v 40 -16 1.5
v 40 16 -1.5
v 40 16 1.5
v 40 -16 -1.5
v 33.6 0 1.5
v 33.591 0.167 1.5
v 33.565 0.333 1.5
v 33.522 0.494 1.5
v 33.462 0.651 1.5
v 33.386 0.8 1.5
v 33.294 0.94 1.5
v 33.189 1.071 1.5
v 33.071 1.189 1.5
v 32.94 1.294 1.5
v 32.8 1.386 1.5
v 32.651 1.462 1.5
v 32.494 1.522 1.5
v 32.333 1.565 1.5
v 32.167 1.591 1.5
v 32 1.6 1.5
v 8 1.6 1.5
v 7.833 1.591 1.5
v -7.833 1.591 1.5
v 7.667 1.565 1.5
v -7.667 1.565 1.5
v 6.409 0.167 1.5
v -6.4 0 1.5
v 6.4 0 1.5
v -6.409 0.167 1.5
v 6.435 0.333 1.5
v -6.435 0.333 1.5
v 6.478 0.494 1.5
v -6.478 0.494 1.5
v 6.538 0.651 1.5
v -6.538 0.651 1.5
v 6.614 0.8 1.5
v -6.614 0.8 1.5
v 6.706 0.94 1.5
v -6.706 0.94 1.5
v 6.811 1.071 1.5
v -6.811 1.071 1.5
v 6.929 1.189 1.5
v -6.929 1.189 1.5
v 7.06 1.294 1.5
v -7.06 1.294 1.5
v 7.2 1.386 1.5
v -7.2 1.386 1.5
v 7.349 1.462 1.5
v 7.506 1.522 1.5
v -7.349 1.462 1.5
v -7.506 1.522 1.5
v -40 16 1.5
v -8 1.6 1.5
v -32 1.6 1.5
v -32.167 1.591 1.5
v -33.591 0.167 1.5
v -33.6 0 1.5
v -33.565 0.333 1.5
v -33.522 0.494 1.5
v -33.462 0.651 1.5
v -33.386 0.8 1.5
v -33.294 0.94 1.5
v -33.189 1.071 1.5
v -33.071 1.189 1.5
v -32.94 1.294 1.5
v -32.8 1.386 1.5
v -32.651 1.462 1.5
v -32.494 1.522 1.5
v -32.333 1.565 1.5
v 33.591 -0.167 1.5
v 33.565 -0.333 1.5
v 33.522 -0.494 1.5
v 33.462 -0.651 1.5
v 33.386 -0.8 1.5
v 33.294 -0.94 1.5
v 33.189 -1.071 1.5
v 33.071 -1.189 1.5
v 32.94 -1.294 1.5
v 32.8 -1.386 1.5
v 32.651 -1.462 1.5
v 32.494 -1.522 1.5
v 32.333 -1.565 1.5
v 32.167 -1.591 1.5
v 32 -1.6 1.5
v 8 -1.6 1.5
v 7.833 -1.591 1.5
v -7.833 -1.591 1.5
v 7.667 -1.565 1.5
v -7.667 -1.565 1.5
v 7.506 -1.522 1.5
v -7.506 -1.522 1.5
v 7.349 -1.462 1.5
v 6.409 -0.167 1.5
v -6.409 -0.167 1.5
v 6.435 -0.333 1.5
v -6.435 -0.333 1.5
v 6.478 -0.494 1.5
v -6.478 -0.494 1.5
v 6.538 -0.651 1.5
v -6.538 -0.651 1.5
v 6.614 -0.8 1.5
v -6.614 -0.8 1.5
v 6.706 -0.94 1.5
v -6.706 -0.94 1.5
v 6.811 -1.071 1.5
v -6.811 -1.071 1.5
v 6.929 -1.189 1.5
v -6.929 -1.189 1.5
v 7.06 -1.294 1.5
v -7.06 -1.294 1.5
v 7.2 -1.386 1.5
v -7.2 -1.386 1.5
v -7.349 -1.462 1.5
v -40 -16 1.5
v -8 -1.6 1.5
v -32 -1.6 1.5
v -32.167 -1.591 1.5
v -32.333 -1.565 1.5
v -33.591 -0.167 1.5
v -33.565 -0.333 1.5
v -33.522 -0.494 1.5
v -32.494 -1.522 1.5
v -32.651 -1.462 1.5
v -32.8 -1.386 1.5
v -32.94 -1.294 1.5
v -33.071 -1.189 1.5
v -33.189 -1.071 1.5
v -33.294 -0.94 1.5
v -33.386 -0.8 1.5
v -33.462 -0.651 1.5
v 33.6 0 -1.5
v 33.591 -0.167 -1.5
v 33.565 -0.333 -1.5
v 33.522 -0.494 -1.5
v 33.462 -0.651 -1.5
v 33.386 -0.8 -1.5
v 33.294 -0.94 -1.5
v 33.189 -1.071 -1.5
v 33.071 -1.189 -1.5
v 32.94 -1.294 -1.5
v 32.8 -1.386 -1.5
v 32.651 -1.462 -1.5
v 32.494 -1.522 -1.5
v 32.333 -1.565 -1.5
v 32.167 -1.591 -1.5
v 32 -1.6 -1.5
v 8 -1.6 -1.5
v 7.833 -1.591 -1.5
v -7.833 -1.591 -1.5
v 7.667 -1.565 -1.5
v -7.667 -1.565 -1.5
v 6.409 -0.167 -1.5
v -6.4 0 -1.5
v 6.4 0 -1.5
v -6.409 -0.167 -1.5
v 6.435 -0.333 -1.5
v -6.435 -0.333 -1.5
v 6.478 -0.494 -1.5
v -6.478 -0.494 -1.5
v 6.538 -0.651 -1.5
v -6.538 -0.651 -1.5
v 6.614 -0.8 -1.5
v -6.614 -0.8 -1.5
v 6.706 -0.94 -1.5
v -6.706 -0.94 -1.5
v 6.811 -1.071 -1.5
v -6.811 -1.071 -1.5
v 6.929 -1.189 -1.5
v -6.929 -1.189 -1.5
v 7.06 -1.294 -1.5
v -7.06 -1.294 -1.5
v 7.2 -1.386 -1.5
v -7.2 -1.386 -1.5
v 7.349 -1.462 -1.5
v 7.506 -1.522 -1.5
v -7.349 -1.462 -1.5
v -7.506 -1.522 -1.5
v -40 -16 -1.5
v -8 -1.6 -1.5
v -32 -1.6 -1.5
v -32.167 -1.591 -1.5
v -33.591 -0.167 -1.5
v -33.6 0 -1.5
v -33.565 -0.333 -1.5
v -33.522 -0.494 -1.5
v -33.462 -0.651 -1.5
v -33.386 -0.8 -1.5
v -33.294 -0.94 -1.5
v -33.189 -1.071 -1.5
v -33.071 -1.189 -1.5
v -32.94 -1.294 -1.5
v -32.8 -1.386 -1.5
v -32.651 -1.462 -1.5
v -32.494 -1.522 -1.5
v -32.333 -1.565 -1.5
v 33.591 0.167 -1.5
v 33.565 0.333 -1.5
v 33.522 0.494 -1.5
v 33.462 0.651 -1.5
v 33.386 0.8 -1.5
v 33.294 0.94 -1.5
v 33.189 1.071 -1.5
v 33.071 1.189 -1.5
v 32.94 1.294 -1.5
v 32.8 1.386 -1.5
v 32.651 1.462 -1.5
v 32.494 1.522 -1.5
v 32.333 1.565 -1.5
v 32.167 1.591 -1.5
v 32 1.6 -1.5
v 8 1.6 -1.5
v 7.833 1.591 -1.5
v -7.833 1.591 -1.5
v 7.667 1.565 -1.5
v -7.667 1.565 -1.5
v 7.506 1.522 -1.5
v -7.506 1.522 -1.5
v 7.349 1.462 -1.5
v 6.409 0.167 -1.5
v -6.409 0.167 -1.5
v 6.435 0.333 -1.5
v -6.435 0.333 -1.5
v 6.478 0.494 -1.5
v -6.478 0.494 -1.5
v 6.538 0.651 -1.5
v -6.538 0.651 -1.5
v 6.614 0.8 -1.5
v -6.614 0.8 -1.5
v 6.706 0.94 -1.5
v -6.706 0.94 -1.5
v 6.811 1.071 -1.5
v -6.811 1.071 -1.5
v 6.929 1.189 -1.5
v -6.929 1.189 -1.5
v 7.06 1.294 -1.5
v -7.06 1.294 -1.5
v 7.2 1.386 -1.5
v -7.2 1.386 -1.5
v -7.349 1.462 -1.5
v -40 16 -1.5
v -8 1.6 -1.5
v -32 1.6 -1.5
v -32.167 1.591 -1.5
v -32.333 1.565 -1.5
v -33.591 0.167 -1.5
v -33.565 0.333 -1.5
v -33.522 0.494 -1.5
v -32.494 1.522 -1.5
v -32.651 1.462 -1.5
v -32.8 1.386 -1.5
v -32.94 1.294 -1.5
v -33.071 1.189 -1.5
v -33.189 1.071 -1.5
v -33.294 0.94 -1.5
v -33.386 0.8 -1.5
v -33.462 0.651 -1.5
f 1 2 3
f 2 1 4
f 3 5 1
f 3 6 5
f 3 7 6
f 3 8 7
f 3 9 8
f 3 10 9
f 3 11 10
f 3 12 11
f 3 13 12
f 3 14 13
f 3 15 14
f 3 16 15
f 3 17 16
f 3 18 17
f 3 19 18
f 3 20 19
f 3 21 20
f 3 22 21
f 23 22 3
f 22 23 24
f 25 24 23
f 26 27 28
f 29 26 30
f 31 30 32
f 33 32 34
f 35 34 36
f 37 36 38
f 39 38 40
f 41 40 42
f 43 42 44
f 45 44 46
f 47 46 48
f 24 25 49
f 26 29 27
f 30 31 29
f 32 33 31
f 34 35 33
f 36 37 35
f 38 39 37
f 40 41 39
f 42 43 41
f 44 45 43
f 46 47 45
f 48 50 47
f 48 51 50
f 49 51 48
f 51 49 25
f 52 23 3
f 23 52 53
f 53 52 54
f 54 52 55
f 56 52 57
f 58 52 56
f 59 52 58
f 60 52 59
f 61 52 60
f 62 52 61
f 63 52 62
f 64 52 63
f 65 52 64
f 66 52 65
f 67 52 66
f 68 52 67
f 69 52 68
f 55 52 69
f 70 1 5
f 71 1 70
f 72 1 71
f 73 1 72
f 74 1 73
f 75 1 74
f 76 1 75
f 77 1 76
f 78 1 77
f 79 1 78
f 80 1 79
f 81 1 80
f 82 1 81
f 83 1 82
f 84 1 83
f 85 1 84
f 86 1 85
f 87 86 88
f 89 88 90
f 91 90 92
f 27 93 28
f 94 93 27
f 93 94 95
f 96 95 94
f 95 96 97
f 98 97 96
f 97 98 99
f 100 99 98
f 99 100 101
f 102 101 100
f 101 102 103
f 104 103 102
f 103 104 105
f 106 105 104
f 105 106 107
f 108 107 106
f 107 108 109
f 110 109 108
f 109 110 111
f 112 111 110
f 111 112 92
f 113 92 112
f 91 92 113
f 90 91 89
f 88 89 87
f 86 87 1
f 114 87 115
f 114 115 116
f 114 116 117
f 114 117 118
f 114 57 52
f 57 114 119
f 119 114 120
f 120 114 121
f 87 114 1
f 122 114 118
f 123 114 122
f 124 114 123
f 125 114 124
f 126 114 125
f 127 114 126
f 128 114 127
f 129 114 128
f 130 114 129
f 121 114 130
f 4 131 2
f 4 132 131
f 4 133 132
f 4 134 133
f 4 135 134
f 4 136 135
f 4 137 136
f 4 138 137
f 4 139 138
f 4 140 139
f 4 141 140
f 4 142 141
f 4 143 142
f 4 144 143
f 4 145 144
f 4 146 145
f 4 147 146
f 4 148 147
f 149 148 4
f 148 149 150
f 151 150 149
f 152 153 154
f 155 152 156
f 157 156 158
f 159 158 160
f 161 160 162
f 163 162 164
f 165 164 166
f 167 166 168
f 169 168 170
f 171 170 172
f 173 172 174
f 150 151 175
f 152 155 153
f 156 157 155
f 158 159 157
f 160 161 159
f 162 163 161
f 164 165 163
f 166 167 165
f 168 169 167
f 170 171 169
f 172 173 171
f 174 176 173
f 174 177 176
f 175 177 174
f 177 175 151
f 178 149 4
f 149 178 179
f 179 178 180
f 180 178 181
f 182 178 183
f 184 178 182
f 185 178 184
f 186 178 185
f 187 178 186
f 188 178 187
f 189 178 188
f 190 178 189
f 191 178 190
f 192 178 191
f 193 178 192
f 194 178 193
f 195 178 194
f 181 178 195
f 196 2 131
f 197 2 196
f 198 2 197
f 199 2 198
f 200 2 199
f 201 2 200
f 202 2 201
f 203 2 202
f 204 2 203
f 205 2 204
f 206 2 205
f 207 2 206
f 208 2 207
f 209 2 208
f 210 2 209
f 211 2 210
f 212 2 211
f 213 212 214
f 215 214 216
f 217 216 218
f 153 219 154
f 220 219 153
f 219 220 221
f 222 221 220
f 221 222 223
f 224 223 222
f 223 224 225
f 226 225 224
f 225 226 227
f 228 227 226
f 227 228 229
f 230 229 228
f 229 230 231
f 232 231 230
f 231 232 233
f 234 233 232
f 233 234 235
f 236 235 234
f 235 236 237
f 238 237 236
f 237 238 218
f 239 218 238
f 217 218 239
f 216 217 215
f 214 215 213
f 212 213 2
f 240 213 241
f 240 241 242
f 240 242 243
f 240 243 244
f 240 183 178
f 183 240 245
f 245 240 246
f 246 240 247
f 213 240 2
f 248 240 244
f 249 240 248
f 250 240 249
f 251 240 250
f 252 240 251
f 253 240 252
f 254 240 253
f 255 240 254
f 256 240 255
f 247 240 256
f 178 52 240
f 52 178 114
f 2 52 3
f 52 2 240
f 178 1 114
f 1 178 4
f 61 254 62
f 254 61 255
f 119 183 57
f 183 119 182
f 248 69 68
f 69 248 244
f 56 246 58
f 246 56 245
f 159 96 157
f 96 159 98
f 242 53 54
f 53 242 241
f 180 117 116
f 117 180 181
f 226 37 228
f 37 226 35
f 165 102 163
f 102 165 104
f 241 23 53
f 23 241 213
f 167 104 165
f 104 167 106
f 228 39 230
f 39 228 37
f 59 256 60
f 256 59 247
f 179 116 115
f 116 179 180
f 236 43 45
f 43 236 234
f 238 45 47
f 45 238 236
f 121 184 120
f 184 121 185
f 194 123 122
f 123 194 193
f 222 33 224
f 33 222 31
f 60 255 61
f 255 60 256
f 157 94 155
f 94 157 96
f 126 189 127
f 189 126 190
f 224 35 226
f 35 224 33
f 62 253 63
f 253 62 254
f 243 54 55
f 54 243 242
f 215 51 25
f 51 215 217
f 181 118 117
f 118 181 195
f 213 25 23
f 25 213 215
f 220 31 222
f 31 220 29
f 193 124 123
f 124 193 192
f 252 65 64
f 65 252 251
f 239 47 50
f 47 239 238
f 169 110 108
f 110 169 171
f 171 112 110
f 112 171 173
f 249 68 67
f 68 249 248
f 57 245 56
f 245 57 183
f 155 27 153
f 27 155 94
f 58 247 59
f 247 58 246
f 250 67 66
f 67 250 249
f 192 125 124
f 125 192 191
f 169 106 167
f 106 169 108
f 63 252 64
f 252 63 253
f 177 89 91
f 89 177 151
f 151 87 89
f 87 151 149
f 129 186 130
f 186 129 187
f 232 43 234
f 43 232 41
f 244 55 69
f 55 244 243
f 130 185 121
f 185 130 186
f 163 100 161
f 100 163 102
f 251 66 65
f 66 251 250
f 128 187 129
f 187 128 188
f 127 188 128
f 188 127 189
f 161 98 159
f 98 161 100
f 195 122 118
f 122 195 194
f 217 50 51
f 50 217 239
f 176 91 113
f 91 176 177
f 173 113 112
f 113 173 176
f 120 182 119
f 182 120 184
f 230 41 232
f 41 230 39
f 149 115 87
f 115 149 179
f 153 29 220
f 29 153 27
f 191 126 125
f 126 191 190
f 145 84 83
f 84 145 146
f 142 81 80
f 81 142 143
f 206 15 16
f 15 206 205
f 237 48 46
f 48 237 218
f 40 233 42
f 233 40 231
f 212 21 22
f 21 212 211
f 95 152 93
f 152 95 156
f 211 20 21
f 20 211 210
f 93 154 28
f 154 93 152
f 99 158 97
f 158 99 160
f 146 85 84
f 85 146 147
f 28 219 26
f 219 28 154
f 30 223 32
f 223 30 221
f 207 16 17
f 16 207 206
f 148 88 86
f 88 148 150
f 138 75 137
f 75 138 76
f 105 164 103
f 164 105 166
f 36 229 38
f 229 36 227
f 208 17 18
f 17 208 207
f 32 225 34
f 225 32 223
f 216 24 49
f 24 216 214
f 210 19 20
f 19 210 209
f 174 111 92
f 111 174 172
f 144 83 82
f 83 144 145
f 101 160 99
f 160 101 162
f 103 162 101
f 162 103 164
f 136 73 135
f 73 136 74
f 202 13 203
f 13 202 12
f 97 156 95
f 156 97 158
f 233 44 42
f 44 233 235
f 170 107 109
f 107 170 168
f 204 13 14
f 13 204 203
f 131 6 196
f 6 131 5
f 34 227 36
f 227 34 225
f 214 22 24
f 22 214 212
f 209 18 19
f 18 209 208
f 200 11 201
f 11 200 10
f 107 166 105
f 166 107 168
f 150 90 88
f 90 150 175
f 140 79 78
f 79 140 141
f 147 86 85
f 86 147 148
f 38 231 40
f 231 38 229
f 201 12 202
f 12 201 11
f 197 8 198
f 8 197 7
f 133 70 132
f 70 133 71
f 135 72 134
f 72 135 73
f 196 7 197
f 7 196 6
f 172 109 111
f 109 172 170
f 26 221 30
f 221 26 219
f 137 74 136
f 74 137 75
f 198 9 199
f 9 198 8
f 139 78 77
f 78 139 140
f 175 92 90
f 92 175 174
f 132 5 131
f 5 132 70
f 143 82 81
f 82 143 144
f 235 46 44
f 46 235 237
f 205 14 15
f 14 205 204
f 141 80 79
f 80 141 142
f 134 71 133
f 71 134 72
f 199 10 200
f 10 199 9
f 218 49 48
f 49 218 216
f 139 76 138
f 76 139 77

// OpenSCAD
// Limit-switch mounting plate.
$fn = 60;
eps = 0.02;
plate_l = 80;
plate_w = 32;
plate_t = 3;
slot_l = 24;
module slot(x) { hull() { translate([x-slot_l/2,0,-plate_t/2-eps]) cylinder(d=3.2,h=plate_t+2*eps); translate([x+slot_l/2,0,-plate_t/2-eps]) cylinder(d=3.2,h=plate_t+2*eps); } }
difference() { cube([plate_l,plate_w,plate_t],center=true); slot(-plate_l/4); slot(plate_l/4); }
